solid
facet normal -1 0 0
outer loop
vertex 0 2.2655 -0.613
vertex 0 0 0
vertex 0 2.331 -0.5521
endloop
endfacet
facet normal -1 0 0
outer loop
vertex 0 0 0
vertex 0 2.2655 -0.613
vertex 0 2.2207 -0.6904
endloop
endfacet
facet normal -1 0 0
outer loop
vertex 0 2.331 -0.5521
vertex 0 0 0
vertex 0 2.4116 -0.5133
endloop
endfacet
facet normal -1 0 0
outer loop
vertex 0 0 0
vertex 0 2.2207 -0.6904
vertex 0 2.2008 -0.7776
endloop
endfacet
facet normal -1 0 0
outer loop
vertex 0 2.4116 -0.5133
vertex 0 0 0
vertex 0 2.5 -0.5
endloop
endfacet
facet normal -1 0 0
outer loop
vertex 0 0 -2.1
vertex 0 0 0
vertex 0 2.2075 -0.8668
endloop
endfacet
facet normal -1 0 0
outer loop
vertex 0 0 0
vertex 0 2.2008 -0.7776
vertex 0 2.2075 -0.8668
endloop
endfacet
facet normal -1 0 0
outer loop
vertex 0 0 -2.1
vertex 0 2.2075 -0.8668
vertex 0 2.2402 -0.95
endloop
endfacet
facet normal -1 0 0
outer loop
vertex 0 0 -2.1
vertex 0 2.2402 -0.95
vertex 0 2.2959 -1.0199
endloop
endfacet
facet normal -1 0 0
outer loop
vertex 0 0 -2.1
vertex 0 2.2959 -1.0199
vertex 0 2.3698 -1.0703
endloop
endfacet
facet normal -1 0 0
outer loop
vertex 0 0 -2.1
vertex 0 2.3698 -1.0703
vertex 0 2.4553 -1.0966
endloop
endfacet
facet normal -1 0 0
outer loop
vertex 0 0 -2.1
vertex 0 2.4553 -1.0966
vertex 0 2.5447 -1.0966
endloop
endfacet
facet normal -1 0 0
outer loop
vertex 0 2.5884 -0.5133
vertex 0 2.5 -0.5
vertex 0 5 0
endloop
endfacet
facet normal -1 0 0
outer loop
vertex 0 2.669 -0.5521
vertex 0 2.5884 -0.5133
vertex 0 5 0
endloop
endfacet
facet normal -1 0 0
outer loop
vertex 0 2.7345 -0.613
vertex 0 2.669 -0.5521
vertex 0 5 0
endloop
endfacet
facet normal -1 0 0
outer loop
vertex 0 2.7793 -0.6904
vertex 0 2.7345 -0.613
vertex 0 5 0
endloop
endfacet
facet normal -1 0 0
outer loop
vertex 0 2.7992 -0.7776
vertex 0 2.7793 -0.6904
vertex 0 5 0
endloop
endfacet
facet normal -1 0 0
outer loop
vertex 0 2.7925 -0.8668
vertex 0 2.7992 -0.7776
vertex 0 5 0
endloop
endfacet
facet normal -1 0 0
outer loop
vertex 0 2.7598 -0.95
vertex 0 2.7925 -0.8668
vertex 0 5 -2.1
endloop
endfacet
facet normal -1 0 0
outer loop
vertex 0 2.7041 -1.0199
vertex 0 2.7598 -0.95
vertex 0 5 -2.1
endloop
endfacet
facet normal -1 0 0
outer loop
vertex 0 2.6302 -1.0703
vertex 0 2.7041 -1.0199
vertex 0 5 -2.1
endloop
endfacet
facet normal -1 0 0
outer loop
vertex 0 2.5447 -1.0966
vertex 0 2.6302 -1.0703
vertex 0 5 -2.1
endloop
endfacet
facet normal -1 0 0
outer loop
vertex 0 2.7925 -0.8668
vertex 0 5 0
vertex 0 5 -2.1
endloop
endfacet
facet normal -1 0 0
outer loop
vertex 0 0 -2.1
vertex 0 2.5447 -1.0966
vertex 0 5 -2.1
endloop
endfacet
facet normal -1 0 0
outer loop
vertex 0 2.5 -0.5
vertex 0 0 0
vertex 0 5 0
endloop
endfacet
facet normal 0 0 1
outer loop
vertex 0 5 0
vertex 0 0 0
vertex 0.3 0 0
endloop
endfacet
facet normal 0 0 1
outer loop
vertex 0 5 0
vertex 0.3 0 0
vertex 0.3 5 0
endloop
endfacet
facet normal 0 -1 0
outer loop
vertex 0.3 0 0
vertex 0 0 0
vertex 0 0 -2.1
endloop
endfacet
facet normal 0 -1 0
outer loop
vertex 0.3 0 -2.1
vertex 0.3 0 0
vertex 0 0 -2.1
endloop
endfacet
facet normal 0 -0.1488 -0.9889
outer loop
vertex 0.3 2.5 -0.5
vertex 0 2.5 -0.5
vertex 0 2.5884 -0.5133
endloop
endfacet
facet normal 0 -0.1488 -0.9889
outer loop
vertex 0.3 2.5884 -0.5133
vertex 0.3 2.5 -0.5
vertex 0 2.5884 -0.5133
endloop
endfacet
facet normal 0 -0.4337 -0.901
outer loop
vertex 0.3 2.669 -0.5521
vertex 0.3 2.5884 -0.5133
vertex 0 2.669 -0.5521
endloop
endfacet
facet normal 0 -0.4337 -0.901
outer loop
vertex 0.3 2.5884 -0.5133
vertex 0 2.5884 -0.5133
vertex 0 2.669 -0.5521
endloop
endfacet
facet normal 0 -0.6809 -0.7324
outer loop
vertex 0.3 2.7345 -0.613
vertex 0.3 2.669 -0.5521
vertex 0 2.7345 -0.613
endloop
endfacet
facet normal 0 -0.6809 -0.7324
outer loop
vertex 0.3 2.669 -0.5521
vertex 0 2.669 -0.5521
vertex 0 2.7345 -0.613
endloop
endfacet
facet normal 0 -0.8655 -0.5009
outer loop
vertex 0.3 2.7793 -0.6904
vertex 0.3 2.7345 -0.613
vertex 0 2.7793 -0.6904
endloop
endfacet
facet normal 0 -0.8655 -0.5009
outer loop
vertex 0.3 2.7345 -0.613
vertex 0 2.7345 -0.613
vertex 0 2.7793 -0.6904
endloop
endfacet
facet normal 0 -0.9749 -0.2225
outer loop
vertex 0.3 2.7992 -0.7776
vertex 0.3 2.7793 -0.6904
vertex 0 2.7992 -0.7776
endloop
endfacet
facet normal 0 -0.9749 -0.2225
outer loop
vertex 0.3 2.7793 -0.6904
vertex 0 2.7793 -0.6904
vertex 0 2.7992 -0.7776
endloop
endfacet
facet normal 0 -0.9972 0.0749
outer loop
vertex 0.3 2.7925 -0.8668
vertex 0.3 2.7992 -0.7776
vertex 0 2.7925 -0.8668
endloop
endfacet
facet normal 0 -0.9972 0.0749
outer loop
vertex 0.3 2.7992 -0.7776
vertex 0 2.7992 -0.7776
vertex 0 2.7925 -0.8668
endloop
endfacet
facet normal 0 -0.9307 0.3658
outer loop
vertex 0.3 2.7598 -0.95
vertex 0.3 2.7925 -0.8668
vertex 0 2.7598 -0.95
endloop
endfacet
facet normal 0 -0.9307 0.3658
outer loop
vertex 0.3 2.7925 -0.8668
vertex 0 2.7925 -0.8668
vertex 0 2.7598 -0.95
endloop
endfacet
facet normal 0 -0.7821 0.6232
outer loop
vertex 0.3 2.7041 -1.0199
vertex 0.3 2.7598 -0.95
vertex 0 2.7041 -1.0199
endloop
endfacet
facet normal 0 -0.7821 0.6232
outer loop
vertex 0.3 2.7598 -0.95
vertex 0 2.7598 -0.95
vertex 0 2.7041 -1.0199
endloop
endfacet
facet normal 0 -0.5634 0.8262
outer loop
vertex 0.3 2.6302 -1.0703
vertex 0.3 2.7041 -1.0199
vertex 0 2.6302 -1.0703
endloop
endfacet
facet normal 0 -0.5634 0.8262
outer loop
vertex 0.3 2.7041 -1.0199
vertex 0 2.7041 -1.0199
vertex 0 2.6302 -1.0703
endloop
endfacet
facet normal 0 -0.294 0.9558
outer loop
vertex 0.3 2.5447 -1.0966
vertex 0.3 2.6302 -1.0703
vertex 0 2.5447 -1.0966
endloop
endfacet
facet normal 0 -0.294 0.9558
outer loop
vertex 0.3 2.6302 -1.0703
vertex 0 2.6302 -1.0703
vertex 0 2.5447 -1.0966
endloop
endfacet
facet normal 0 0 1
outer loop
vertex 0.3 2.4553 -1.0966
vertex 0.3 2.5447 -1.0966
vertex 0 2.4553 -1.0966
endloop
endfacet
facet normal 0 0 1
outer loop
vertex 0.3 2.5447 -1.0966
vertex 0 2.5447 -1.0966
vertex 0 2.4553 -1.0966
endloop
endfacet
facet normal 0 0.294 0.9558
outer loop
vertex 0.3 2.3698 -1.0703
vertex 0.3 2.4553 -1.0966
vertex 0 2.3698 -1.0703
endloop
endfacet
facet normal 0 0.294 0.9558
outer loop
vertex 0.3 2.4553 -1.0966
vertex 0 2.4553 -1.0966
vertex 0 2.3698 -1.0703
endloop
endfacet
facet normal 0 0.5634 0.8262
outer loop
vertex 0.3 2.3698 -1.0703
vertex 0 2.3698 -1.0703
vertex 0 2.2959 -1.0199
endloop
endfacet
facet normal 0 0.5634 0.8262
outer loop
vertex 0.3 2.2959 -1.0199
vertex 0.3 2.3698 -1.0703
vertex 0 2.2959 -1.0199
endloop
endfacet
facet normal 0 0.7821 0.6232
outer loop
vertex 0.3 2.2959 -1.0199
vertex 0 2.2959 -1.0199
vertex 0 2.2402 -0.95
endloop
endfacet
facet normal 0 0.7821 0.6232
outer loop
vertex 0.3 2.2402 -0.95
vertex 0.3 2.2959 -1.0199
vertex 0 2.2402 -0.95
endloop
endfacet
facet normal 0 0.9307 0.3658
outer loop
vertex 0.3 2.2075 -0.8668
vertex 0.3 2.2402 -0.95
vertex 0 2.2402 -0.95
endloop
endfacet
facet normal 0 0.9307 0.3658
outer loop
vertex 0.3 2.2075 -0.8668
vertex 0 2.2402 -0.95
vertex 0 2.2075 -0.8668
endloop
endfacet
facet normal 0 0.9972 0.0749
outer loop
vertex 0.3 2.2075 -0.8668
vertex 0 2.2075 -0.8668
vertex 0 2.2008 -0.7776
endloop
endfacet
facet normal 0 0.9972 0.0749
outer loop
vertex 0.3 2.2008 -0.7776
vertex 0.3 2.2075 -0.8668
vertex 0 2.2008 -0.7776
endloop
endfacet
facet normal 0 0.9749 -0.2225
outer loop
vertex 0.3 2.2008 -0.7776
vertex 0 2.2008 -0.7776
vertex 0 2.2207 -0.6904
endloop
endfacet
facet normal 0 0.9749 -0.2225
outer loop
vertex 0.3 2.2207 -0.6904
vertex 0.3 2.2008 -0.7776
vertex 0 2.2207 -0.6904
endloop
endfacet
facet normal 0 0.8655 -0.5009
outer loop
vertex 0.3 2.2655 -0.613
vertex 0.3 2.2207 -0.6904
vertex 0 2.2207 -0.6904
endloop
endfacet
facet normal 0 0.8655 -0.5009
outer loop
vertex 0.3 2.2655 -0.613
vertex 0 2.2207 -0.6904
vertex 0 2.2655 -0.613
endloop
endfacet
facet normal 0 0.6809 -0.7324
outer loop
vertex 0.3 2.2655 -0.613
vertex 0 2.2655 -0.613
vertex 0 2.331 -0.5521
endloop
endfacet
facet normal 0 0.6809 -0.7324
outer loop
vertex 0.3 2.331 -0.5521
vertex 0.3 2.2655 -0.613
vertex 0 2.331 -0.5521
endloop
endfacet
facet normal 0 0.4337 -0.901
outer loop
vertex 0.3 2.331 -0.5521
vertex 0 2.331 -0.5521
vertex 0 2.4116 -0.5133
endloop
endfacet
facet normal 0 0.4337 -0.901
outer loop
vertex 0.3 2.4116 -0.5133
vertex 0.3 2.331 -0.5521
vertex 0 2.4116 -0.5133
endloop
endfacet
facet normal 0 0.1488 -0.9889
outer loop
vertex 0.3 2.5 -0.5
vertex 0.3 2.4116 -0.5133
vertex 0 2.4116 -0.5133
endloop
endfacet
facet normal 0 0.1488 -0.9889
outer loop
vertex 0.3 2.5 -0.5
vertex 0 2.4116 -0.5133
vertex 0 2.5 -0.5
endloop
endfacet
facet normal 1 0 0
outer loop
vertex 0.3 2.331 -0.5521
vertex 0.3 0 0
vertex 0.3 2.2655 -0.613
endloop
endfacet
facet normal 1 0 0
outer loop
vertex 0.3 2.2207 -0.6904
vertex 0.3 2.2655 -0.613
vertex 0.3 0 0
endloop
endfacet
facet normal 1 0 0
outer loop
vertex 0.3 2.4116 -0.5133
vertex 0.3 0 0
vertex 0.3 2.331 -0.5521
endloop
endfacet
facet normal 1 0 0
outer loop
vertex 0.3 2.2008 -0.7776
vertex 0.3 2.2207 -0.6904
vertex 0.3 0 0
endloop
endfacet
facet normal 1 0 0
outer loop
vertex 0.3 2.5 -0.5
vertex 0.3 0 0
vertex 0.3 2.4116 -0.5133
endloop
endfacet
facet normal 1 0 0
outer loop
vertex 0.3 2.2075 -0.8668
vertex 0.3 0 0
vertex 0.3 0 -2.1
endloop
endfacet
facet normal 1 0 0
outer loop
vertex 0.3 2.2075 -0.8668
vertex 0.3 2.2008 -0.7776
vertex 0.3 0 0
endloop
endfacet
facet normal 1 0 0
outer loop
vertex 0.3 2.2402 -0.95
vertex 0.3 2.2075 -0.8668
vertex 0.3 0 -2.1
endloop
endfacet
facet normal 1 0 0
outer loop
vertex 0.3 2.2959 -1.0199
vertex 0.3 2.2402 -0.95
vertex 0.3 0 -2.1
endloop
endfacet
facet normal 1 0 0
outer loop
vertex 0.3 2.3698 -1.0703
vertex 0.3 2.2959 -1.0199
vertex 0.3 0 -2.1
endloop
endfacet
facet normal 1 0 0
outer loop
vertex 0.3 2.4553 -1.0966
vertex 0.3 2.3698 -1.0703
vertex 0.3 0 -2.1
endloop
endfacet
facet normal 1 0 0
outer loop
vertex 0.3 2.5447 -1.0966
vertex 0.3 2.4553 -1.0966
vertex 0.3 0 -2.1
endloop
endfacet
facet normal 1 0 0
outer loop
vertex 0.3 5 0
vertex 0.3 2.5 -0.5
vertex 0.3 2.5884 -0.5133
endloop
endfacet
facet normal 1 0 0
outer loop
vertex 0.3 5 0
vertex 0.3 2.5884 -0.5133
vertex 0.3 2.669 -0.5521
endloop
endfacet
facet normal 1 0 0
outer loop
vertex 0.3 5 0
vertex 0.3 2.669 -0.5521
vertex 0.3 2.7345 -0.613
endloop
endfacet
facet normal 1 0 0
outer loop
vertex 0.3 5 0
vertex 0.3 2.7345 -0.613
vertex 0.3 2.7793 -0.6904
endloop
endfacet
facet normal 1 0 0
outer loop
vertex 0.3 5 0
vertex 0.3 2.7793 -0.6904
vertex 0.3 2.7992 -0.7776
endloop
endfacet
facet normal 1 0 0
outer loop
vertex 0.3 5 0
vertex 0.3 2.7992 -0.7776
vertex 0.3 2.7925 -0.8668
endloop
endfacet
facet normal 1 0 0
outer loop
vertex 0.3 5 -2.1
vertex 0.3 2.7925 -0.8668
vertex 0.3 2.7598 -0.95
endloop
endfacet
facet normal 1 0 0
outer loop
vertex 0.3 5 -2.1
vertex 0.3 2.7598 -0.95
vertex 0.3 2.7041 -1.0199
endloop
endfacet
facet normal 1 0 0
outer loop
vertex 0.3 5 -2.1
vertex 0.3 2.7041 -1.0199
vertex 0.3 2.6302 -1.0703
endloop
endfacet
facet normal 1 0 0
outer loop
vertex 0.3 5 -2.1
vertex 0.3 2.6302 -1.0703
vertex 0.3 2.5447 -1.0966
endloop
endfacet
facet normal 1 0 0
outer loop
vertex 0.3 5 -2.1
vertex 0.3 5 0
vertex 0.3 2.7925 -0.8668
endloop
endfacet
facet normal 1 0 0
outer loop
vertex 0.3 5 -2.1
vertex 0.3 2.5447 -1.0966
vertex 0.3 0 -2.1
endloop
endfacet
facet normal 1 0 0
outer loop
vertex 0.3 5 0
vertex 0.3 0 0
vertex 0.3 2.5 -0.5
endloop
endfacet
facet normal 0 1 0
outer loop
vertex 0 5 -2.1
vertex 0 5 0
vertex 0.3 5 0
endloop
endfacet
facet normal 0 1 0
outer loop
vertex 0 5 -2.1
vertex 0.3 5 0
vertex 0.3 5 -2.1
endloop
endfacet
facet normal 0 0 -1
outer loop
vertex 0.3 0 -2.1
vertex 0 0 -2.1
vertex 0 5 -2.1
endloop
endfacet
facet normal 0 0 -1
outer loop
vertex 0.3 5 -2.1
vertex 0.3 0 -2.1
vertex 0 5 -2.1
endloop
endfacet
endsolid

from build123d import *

# Parameters (mm, degrees)
SKETCH1_W                  = 2.1
SKETCH1_H                  = 5
BOSS_EXTRUDE1_DEPTH        = 0.3
F_0_6_0_6_DIAMETER_HOLE1_D = 0.6


with BuildPart() as part:
    # Sketch1 → Boss-Extrude1 (new body)
    with BuildSketch(Plane(origin=(0, 0, 0), x_dir=(0, 0, -1), z_dir=(1, 0, 0))):
        with Locations((1.05, 2.5)):
            Rectangle(SKETCH1_W, SKETCH1_H)
    extrude(amount=BOSS_EXTRUDE1_DEPTH)

    # Ø0.6 (0.6) Diameter Hole1 (through all)
    with Locations(Plane(origin=(0.3, 0, 0), x_dir=(0, 0, -1), z_dir=(1, 0, 0))):
        with Locations((0.8, 2.5)):
            Hole(F_0_6_0_6_DIAMETER_HOLE1_D / 2)


solid = part.part
